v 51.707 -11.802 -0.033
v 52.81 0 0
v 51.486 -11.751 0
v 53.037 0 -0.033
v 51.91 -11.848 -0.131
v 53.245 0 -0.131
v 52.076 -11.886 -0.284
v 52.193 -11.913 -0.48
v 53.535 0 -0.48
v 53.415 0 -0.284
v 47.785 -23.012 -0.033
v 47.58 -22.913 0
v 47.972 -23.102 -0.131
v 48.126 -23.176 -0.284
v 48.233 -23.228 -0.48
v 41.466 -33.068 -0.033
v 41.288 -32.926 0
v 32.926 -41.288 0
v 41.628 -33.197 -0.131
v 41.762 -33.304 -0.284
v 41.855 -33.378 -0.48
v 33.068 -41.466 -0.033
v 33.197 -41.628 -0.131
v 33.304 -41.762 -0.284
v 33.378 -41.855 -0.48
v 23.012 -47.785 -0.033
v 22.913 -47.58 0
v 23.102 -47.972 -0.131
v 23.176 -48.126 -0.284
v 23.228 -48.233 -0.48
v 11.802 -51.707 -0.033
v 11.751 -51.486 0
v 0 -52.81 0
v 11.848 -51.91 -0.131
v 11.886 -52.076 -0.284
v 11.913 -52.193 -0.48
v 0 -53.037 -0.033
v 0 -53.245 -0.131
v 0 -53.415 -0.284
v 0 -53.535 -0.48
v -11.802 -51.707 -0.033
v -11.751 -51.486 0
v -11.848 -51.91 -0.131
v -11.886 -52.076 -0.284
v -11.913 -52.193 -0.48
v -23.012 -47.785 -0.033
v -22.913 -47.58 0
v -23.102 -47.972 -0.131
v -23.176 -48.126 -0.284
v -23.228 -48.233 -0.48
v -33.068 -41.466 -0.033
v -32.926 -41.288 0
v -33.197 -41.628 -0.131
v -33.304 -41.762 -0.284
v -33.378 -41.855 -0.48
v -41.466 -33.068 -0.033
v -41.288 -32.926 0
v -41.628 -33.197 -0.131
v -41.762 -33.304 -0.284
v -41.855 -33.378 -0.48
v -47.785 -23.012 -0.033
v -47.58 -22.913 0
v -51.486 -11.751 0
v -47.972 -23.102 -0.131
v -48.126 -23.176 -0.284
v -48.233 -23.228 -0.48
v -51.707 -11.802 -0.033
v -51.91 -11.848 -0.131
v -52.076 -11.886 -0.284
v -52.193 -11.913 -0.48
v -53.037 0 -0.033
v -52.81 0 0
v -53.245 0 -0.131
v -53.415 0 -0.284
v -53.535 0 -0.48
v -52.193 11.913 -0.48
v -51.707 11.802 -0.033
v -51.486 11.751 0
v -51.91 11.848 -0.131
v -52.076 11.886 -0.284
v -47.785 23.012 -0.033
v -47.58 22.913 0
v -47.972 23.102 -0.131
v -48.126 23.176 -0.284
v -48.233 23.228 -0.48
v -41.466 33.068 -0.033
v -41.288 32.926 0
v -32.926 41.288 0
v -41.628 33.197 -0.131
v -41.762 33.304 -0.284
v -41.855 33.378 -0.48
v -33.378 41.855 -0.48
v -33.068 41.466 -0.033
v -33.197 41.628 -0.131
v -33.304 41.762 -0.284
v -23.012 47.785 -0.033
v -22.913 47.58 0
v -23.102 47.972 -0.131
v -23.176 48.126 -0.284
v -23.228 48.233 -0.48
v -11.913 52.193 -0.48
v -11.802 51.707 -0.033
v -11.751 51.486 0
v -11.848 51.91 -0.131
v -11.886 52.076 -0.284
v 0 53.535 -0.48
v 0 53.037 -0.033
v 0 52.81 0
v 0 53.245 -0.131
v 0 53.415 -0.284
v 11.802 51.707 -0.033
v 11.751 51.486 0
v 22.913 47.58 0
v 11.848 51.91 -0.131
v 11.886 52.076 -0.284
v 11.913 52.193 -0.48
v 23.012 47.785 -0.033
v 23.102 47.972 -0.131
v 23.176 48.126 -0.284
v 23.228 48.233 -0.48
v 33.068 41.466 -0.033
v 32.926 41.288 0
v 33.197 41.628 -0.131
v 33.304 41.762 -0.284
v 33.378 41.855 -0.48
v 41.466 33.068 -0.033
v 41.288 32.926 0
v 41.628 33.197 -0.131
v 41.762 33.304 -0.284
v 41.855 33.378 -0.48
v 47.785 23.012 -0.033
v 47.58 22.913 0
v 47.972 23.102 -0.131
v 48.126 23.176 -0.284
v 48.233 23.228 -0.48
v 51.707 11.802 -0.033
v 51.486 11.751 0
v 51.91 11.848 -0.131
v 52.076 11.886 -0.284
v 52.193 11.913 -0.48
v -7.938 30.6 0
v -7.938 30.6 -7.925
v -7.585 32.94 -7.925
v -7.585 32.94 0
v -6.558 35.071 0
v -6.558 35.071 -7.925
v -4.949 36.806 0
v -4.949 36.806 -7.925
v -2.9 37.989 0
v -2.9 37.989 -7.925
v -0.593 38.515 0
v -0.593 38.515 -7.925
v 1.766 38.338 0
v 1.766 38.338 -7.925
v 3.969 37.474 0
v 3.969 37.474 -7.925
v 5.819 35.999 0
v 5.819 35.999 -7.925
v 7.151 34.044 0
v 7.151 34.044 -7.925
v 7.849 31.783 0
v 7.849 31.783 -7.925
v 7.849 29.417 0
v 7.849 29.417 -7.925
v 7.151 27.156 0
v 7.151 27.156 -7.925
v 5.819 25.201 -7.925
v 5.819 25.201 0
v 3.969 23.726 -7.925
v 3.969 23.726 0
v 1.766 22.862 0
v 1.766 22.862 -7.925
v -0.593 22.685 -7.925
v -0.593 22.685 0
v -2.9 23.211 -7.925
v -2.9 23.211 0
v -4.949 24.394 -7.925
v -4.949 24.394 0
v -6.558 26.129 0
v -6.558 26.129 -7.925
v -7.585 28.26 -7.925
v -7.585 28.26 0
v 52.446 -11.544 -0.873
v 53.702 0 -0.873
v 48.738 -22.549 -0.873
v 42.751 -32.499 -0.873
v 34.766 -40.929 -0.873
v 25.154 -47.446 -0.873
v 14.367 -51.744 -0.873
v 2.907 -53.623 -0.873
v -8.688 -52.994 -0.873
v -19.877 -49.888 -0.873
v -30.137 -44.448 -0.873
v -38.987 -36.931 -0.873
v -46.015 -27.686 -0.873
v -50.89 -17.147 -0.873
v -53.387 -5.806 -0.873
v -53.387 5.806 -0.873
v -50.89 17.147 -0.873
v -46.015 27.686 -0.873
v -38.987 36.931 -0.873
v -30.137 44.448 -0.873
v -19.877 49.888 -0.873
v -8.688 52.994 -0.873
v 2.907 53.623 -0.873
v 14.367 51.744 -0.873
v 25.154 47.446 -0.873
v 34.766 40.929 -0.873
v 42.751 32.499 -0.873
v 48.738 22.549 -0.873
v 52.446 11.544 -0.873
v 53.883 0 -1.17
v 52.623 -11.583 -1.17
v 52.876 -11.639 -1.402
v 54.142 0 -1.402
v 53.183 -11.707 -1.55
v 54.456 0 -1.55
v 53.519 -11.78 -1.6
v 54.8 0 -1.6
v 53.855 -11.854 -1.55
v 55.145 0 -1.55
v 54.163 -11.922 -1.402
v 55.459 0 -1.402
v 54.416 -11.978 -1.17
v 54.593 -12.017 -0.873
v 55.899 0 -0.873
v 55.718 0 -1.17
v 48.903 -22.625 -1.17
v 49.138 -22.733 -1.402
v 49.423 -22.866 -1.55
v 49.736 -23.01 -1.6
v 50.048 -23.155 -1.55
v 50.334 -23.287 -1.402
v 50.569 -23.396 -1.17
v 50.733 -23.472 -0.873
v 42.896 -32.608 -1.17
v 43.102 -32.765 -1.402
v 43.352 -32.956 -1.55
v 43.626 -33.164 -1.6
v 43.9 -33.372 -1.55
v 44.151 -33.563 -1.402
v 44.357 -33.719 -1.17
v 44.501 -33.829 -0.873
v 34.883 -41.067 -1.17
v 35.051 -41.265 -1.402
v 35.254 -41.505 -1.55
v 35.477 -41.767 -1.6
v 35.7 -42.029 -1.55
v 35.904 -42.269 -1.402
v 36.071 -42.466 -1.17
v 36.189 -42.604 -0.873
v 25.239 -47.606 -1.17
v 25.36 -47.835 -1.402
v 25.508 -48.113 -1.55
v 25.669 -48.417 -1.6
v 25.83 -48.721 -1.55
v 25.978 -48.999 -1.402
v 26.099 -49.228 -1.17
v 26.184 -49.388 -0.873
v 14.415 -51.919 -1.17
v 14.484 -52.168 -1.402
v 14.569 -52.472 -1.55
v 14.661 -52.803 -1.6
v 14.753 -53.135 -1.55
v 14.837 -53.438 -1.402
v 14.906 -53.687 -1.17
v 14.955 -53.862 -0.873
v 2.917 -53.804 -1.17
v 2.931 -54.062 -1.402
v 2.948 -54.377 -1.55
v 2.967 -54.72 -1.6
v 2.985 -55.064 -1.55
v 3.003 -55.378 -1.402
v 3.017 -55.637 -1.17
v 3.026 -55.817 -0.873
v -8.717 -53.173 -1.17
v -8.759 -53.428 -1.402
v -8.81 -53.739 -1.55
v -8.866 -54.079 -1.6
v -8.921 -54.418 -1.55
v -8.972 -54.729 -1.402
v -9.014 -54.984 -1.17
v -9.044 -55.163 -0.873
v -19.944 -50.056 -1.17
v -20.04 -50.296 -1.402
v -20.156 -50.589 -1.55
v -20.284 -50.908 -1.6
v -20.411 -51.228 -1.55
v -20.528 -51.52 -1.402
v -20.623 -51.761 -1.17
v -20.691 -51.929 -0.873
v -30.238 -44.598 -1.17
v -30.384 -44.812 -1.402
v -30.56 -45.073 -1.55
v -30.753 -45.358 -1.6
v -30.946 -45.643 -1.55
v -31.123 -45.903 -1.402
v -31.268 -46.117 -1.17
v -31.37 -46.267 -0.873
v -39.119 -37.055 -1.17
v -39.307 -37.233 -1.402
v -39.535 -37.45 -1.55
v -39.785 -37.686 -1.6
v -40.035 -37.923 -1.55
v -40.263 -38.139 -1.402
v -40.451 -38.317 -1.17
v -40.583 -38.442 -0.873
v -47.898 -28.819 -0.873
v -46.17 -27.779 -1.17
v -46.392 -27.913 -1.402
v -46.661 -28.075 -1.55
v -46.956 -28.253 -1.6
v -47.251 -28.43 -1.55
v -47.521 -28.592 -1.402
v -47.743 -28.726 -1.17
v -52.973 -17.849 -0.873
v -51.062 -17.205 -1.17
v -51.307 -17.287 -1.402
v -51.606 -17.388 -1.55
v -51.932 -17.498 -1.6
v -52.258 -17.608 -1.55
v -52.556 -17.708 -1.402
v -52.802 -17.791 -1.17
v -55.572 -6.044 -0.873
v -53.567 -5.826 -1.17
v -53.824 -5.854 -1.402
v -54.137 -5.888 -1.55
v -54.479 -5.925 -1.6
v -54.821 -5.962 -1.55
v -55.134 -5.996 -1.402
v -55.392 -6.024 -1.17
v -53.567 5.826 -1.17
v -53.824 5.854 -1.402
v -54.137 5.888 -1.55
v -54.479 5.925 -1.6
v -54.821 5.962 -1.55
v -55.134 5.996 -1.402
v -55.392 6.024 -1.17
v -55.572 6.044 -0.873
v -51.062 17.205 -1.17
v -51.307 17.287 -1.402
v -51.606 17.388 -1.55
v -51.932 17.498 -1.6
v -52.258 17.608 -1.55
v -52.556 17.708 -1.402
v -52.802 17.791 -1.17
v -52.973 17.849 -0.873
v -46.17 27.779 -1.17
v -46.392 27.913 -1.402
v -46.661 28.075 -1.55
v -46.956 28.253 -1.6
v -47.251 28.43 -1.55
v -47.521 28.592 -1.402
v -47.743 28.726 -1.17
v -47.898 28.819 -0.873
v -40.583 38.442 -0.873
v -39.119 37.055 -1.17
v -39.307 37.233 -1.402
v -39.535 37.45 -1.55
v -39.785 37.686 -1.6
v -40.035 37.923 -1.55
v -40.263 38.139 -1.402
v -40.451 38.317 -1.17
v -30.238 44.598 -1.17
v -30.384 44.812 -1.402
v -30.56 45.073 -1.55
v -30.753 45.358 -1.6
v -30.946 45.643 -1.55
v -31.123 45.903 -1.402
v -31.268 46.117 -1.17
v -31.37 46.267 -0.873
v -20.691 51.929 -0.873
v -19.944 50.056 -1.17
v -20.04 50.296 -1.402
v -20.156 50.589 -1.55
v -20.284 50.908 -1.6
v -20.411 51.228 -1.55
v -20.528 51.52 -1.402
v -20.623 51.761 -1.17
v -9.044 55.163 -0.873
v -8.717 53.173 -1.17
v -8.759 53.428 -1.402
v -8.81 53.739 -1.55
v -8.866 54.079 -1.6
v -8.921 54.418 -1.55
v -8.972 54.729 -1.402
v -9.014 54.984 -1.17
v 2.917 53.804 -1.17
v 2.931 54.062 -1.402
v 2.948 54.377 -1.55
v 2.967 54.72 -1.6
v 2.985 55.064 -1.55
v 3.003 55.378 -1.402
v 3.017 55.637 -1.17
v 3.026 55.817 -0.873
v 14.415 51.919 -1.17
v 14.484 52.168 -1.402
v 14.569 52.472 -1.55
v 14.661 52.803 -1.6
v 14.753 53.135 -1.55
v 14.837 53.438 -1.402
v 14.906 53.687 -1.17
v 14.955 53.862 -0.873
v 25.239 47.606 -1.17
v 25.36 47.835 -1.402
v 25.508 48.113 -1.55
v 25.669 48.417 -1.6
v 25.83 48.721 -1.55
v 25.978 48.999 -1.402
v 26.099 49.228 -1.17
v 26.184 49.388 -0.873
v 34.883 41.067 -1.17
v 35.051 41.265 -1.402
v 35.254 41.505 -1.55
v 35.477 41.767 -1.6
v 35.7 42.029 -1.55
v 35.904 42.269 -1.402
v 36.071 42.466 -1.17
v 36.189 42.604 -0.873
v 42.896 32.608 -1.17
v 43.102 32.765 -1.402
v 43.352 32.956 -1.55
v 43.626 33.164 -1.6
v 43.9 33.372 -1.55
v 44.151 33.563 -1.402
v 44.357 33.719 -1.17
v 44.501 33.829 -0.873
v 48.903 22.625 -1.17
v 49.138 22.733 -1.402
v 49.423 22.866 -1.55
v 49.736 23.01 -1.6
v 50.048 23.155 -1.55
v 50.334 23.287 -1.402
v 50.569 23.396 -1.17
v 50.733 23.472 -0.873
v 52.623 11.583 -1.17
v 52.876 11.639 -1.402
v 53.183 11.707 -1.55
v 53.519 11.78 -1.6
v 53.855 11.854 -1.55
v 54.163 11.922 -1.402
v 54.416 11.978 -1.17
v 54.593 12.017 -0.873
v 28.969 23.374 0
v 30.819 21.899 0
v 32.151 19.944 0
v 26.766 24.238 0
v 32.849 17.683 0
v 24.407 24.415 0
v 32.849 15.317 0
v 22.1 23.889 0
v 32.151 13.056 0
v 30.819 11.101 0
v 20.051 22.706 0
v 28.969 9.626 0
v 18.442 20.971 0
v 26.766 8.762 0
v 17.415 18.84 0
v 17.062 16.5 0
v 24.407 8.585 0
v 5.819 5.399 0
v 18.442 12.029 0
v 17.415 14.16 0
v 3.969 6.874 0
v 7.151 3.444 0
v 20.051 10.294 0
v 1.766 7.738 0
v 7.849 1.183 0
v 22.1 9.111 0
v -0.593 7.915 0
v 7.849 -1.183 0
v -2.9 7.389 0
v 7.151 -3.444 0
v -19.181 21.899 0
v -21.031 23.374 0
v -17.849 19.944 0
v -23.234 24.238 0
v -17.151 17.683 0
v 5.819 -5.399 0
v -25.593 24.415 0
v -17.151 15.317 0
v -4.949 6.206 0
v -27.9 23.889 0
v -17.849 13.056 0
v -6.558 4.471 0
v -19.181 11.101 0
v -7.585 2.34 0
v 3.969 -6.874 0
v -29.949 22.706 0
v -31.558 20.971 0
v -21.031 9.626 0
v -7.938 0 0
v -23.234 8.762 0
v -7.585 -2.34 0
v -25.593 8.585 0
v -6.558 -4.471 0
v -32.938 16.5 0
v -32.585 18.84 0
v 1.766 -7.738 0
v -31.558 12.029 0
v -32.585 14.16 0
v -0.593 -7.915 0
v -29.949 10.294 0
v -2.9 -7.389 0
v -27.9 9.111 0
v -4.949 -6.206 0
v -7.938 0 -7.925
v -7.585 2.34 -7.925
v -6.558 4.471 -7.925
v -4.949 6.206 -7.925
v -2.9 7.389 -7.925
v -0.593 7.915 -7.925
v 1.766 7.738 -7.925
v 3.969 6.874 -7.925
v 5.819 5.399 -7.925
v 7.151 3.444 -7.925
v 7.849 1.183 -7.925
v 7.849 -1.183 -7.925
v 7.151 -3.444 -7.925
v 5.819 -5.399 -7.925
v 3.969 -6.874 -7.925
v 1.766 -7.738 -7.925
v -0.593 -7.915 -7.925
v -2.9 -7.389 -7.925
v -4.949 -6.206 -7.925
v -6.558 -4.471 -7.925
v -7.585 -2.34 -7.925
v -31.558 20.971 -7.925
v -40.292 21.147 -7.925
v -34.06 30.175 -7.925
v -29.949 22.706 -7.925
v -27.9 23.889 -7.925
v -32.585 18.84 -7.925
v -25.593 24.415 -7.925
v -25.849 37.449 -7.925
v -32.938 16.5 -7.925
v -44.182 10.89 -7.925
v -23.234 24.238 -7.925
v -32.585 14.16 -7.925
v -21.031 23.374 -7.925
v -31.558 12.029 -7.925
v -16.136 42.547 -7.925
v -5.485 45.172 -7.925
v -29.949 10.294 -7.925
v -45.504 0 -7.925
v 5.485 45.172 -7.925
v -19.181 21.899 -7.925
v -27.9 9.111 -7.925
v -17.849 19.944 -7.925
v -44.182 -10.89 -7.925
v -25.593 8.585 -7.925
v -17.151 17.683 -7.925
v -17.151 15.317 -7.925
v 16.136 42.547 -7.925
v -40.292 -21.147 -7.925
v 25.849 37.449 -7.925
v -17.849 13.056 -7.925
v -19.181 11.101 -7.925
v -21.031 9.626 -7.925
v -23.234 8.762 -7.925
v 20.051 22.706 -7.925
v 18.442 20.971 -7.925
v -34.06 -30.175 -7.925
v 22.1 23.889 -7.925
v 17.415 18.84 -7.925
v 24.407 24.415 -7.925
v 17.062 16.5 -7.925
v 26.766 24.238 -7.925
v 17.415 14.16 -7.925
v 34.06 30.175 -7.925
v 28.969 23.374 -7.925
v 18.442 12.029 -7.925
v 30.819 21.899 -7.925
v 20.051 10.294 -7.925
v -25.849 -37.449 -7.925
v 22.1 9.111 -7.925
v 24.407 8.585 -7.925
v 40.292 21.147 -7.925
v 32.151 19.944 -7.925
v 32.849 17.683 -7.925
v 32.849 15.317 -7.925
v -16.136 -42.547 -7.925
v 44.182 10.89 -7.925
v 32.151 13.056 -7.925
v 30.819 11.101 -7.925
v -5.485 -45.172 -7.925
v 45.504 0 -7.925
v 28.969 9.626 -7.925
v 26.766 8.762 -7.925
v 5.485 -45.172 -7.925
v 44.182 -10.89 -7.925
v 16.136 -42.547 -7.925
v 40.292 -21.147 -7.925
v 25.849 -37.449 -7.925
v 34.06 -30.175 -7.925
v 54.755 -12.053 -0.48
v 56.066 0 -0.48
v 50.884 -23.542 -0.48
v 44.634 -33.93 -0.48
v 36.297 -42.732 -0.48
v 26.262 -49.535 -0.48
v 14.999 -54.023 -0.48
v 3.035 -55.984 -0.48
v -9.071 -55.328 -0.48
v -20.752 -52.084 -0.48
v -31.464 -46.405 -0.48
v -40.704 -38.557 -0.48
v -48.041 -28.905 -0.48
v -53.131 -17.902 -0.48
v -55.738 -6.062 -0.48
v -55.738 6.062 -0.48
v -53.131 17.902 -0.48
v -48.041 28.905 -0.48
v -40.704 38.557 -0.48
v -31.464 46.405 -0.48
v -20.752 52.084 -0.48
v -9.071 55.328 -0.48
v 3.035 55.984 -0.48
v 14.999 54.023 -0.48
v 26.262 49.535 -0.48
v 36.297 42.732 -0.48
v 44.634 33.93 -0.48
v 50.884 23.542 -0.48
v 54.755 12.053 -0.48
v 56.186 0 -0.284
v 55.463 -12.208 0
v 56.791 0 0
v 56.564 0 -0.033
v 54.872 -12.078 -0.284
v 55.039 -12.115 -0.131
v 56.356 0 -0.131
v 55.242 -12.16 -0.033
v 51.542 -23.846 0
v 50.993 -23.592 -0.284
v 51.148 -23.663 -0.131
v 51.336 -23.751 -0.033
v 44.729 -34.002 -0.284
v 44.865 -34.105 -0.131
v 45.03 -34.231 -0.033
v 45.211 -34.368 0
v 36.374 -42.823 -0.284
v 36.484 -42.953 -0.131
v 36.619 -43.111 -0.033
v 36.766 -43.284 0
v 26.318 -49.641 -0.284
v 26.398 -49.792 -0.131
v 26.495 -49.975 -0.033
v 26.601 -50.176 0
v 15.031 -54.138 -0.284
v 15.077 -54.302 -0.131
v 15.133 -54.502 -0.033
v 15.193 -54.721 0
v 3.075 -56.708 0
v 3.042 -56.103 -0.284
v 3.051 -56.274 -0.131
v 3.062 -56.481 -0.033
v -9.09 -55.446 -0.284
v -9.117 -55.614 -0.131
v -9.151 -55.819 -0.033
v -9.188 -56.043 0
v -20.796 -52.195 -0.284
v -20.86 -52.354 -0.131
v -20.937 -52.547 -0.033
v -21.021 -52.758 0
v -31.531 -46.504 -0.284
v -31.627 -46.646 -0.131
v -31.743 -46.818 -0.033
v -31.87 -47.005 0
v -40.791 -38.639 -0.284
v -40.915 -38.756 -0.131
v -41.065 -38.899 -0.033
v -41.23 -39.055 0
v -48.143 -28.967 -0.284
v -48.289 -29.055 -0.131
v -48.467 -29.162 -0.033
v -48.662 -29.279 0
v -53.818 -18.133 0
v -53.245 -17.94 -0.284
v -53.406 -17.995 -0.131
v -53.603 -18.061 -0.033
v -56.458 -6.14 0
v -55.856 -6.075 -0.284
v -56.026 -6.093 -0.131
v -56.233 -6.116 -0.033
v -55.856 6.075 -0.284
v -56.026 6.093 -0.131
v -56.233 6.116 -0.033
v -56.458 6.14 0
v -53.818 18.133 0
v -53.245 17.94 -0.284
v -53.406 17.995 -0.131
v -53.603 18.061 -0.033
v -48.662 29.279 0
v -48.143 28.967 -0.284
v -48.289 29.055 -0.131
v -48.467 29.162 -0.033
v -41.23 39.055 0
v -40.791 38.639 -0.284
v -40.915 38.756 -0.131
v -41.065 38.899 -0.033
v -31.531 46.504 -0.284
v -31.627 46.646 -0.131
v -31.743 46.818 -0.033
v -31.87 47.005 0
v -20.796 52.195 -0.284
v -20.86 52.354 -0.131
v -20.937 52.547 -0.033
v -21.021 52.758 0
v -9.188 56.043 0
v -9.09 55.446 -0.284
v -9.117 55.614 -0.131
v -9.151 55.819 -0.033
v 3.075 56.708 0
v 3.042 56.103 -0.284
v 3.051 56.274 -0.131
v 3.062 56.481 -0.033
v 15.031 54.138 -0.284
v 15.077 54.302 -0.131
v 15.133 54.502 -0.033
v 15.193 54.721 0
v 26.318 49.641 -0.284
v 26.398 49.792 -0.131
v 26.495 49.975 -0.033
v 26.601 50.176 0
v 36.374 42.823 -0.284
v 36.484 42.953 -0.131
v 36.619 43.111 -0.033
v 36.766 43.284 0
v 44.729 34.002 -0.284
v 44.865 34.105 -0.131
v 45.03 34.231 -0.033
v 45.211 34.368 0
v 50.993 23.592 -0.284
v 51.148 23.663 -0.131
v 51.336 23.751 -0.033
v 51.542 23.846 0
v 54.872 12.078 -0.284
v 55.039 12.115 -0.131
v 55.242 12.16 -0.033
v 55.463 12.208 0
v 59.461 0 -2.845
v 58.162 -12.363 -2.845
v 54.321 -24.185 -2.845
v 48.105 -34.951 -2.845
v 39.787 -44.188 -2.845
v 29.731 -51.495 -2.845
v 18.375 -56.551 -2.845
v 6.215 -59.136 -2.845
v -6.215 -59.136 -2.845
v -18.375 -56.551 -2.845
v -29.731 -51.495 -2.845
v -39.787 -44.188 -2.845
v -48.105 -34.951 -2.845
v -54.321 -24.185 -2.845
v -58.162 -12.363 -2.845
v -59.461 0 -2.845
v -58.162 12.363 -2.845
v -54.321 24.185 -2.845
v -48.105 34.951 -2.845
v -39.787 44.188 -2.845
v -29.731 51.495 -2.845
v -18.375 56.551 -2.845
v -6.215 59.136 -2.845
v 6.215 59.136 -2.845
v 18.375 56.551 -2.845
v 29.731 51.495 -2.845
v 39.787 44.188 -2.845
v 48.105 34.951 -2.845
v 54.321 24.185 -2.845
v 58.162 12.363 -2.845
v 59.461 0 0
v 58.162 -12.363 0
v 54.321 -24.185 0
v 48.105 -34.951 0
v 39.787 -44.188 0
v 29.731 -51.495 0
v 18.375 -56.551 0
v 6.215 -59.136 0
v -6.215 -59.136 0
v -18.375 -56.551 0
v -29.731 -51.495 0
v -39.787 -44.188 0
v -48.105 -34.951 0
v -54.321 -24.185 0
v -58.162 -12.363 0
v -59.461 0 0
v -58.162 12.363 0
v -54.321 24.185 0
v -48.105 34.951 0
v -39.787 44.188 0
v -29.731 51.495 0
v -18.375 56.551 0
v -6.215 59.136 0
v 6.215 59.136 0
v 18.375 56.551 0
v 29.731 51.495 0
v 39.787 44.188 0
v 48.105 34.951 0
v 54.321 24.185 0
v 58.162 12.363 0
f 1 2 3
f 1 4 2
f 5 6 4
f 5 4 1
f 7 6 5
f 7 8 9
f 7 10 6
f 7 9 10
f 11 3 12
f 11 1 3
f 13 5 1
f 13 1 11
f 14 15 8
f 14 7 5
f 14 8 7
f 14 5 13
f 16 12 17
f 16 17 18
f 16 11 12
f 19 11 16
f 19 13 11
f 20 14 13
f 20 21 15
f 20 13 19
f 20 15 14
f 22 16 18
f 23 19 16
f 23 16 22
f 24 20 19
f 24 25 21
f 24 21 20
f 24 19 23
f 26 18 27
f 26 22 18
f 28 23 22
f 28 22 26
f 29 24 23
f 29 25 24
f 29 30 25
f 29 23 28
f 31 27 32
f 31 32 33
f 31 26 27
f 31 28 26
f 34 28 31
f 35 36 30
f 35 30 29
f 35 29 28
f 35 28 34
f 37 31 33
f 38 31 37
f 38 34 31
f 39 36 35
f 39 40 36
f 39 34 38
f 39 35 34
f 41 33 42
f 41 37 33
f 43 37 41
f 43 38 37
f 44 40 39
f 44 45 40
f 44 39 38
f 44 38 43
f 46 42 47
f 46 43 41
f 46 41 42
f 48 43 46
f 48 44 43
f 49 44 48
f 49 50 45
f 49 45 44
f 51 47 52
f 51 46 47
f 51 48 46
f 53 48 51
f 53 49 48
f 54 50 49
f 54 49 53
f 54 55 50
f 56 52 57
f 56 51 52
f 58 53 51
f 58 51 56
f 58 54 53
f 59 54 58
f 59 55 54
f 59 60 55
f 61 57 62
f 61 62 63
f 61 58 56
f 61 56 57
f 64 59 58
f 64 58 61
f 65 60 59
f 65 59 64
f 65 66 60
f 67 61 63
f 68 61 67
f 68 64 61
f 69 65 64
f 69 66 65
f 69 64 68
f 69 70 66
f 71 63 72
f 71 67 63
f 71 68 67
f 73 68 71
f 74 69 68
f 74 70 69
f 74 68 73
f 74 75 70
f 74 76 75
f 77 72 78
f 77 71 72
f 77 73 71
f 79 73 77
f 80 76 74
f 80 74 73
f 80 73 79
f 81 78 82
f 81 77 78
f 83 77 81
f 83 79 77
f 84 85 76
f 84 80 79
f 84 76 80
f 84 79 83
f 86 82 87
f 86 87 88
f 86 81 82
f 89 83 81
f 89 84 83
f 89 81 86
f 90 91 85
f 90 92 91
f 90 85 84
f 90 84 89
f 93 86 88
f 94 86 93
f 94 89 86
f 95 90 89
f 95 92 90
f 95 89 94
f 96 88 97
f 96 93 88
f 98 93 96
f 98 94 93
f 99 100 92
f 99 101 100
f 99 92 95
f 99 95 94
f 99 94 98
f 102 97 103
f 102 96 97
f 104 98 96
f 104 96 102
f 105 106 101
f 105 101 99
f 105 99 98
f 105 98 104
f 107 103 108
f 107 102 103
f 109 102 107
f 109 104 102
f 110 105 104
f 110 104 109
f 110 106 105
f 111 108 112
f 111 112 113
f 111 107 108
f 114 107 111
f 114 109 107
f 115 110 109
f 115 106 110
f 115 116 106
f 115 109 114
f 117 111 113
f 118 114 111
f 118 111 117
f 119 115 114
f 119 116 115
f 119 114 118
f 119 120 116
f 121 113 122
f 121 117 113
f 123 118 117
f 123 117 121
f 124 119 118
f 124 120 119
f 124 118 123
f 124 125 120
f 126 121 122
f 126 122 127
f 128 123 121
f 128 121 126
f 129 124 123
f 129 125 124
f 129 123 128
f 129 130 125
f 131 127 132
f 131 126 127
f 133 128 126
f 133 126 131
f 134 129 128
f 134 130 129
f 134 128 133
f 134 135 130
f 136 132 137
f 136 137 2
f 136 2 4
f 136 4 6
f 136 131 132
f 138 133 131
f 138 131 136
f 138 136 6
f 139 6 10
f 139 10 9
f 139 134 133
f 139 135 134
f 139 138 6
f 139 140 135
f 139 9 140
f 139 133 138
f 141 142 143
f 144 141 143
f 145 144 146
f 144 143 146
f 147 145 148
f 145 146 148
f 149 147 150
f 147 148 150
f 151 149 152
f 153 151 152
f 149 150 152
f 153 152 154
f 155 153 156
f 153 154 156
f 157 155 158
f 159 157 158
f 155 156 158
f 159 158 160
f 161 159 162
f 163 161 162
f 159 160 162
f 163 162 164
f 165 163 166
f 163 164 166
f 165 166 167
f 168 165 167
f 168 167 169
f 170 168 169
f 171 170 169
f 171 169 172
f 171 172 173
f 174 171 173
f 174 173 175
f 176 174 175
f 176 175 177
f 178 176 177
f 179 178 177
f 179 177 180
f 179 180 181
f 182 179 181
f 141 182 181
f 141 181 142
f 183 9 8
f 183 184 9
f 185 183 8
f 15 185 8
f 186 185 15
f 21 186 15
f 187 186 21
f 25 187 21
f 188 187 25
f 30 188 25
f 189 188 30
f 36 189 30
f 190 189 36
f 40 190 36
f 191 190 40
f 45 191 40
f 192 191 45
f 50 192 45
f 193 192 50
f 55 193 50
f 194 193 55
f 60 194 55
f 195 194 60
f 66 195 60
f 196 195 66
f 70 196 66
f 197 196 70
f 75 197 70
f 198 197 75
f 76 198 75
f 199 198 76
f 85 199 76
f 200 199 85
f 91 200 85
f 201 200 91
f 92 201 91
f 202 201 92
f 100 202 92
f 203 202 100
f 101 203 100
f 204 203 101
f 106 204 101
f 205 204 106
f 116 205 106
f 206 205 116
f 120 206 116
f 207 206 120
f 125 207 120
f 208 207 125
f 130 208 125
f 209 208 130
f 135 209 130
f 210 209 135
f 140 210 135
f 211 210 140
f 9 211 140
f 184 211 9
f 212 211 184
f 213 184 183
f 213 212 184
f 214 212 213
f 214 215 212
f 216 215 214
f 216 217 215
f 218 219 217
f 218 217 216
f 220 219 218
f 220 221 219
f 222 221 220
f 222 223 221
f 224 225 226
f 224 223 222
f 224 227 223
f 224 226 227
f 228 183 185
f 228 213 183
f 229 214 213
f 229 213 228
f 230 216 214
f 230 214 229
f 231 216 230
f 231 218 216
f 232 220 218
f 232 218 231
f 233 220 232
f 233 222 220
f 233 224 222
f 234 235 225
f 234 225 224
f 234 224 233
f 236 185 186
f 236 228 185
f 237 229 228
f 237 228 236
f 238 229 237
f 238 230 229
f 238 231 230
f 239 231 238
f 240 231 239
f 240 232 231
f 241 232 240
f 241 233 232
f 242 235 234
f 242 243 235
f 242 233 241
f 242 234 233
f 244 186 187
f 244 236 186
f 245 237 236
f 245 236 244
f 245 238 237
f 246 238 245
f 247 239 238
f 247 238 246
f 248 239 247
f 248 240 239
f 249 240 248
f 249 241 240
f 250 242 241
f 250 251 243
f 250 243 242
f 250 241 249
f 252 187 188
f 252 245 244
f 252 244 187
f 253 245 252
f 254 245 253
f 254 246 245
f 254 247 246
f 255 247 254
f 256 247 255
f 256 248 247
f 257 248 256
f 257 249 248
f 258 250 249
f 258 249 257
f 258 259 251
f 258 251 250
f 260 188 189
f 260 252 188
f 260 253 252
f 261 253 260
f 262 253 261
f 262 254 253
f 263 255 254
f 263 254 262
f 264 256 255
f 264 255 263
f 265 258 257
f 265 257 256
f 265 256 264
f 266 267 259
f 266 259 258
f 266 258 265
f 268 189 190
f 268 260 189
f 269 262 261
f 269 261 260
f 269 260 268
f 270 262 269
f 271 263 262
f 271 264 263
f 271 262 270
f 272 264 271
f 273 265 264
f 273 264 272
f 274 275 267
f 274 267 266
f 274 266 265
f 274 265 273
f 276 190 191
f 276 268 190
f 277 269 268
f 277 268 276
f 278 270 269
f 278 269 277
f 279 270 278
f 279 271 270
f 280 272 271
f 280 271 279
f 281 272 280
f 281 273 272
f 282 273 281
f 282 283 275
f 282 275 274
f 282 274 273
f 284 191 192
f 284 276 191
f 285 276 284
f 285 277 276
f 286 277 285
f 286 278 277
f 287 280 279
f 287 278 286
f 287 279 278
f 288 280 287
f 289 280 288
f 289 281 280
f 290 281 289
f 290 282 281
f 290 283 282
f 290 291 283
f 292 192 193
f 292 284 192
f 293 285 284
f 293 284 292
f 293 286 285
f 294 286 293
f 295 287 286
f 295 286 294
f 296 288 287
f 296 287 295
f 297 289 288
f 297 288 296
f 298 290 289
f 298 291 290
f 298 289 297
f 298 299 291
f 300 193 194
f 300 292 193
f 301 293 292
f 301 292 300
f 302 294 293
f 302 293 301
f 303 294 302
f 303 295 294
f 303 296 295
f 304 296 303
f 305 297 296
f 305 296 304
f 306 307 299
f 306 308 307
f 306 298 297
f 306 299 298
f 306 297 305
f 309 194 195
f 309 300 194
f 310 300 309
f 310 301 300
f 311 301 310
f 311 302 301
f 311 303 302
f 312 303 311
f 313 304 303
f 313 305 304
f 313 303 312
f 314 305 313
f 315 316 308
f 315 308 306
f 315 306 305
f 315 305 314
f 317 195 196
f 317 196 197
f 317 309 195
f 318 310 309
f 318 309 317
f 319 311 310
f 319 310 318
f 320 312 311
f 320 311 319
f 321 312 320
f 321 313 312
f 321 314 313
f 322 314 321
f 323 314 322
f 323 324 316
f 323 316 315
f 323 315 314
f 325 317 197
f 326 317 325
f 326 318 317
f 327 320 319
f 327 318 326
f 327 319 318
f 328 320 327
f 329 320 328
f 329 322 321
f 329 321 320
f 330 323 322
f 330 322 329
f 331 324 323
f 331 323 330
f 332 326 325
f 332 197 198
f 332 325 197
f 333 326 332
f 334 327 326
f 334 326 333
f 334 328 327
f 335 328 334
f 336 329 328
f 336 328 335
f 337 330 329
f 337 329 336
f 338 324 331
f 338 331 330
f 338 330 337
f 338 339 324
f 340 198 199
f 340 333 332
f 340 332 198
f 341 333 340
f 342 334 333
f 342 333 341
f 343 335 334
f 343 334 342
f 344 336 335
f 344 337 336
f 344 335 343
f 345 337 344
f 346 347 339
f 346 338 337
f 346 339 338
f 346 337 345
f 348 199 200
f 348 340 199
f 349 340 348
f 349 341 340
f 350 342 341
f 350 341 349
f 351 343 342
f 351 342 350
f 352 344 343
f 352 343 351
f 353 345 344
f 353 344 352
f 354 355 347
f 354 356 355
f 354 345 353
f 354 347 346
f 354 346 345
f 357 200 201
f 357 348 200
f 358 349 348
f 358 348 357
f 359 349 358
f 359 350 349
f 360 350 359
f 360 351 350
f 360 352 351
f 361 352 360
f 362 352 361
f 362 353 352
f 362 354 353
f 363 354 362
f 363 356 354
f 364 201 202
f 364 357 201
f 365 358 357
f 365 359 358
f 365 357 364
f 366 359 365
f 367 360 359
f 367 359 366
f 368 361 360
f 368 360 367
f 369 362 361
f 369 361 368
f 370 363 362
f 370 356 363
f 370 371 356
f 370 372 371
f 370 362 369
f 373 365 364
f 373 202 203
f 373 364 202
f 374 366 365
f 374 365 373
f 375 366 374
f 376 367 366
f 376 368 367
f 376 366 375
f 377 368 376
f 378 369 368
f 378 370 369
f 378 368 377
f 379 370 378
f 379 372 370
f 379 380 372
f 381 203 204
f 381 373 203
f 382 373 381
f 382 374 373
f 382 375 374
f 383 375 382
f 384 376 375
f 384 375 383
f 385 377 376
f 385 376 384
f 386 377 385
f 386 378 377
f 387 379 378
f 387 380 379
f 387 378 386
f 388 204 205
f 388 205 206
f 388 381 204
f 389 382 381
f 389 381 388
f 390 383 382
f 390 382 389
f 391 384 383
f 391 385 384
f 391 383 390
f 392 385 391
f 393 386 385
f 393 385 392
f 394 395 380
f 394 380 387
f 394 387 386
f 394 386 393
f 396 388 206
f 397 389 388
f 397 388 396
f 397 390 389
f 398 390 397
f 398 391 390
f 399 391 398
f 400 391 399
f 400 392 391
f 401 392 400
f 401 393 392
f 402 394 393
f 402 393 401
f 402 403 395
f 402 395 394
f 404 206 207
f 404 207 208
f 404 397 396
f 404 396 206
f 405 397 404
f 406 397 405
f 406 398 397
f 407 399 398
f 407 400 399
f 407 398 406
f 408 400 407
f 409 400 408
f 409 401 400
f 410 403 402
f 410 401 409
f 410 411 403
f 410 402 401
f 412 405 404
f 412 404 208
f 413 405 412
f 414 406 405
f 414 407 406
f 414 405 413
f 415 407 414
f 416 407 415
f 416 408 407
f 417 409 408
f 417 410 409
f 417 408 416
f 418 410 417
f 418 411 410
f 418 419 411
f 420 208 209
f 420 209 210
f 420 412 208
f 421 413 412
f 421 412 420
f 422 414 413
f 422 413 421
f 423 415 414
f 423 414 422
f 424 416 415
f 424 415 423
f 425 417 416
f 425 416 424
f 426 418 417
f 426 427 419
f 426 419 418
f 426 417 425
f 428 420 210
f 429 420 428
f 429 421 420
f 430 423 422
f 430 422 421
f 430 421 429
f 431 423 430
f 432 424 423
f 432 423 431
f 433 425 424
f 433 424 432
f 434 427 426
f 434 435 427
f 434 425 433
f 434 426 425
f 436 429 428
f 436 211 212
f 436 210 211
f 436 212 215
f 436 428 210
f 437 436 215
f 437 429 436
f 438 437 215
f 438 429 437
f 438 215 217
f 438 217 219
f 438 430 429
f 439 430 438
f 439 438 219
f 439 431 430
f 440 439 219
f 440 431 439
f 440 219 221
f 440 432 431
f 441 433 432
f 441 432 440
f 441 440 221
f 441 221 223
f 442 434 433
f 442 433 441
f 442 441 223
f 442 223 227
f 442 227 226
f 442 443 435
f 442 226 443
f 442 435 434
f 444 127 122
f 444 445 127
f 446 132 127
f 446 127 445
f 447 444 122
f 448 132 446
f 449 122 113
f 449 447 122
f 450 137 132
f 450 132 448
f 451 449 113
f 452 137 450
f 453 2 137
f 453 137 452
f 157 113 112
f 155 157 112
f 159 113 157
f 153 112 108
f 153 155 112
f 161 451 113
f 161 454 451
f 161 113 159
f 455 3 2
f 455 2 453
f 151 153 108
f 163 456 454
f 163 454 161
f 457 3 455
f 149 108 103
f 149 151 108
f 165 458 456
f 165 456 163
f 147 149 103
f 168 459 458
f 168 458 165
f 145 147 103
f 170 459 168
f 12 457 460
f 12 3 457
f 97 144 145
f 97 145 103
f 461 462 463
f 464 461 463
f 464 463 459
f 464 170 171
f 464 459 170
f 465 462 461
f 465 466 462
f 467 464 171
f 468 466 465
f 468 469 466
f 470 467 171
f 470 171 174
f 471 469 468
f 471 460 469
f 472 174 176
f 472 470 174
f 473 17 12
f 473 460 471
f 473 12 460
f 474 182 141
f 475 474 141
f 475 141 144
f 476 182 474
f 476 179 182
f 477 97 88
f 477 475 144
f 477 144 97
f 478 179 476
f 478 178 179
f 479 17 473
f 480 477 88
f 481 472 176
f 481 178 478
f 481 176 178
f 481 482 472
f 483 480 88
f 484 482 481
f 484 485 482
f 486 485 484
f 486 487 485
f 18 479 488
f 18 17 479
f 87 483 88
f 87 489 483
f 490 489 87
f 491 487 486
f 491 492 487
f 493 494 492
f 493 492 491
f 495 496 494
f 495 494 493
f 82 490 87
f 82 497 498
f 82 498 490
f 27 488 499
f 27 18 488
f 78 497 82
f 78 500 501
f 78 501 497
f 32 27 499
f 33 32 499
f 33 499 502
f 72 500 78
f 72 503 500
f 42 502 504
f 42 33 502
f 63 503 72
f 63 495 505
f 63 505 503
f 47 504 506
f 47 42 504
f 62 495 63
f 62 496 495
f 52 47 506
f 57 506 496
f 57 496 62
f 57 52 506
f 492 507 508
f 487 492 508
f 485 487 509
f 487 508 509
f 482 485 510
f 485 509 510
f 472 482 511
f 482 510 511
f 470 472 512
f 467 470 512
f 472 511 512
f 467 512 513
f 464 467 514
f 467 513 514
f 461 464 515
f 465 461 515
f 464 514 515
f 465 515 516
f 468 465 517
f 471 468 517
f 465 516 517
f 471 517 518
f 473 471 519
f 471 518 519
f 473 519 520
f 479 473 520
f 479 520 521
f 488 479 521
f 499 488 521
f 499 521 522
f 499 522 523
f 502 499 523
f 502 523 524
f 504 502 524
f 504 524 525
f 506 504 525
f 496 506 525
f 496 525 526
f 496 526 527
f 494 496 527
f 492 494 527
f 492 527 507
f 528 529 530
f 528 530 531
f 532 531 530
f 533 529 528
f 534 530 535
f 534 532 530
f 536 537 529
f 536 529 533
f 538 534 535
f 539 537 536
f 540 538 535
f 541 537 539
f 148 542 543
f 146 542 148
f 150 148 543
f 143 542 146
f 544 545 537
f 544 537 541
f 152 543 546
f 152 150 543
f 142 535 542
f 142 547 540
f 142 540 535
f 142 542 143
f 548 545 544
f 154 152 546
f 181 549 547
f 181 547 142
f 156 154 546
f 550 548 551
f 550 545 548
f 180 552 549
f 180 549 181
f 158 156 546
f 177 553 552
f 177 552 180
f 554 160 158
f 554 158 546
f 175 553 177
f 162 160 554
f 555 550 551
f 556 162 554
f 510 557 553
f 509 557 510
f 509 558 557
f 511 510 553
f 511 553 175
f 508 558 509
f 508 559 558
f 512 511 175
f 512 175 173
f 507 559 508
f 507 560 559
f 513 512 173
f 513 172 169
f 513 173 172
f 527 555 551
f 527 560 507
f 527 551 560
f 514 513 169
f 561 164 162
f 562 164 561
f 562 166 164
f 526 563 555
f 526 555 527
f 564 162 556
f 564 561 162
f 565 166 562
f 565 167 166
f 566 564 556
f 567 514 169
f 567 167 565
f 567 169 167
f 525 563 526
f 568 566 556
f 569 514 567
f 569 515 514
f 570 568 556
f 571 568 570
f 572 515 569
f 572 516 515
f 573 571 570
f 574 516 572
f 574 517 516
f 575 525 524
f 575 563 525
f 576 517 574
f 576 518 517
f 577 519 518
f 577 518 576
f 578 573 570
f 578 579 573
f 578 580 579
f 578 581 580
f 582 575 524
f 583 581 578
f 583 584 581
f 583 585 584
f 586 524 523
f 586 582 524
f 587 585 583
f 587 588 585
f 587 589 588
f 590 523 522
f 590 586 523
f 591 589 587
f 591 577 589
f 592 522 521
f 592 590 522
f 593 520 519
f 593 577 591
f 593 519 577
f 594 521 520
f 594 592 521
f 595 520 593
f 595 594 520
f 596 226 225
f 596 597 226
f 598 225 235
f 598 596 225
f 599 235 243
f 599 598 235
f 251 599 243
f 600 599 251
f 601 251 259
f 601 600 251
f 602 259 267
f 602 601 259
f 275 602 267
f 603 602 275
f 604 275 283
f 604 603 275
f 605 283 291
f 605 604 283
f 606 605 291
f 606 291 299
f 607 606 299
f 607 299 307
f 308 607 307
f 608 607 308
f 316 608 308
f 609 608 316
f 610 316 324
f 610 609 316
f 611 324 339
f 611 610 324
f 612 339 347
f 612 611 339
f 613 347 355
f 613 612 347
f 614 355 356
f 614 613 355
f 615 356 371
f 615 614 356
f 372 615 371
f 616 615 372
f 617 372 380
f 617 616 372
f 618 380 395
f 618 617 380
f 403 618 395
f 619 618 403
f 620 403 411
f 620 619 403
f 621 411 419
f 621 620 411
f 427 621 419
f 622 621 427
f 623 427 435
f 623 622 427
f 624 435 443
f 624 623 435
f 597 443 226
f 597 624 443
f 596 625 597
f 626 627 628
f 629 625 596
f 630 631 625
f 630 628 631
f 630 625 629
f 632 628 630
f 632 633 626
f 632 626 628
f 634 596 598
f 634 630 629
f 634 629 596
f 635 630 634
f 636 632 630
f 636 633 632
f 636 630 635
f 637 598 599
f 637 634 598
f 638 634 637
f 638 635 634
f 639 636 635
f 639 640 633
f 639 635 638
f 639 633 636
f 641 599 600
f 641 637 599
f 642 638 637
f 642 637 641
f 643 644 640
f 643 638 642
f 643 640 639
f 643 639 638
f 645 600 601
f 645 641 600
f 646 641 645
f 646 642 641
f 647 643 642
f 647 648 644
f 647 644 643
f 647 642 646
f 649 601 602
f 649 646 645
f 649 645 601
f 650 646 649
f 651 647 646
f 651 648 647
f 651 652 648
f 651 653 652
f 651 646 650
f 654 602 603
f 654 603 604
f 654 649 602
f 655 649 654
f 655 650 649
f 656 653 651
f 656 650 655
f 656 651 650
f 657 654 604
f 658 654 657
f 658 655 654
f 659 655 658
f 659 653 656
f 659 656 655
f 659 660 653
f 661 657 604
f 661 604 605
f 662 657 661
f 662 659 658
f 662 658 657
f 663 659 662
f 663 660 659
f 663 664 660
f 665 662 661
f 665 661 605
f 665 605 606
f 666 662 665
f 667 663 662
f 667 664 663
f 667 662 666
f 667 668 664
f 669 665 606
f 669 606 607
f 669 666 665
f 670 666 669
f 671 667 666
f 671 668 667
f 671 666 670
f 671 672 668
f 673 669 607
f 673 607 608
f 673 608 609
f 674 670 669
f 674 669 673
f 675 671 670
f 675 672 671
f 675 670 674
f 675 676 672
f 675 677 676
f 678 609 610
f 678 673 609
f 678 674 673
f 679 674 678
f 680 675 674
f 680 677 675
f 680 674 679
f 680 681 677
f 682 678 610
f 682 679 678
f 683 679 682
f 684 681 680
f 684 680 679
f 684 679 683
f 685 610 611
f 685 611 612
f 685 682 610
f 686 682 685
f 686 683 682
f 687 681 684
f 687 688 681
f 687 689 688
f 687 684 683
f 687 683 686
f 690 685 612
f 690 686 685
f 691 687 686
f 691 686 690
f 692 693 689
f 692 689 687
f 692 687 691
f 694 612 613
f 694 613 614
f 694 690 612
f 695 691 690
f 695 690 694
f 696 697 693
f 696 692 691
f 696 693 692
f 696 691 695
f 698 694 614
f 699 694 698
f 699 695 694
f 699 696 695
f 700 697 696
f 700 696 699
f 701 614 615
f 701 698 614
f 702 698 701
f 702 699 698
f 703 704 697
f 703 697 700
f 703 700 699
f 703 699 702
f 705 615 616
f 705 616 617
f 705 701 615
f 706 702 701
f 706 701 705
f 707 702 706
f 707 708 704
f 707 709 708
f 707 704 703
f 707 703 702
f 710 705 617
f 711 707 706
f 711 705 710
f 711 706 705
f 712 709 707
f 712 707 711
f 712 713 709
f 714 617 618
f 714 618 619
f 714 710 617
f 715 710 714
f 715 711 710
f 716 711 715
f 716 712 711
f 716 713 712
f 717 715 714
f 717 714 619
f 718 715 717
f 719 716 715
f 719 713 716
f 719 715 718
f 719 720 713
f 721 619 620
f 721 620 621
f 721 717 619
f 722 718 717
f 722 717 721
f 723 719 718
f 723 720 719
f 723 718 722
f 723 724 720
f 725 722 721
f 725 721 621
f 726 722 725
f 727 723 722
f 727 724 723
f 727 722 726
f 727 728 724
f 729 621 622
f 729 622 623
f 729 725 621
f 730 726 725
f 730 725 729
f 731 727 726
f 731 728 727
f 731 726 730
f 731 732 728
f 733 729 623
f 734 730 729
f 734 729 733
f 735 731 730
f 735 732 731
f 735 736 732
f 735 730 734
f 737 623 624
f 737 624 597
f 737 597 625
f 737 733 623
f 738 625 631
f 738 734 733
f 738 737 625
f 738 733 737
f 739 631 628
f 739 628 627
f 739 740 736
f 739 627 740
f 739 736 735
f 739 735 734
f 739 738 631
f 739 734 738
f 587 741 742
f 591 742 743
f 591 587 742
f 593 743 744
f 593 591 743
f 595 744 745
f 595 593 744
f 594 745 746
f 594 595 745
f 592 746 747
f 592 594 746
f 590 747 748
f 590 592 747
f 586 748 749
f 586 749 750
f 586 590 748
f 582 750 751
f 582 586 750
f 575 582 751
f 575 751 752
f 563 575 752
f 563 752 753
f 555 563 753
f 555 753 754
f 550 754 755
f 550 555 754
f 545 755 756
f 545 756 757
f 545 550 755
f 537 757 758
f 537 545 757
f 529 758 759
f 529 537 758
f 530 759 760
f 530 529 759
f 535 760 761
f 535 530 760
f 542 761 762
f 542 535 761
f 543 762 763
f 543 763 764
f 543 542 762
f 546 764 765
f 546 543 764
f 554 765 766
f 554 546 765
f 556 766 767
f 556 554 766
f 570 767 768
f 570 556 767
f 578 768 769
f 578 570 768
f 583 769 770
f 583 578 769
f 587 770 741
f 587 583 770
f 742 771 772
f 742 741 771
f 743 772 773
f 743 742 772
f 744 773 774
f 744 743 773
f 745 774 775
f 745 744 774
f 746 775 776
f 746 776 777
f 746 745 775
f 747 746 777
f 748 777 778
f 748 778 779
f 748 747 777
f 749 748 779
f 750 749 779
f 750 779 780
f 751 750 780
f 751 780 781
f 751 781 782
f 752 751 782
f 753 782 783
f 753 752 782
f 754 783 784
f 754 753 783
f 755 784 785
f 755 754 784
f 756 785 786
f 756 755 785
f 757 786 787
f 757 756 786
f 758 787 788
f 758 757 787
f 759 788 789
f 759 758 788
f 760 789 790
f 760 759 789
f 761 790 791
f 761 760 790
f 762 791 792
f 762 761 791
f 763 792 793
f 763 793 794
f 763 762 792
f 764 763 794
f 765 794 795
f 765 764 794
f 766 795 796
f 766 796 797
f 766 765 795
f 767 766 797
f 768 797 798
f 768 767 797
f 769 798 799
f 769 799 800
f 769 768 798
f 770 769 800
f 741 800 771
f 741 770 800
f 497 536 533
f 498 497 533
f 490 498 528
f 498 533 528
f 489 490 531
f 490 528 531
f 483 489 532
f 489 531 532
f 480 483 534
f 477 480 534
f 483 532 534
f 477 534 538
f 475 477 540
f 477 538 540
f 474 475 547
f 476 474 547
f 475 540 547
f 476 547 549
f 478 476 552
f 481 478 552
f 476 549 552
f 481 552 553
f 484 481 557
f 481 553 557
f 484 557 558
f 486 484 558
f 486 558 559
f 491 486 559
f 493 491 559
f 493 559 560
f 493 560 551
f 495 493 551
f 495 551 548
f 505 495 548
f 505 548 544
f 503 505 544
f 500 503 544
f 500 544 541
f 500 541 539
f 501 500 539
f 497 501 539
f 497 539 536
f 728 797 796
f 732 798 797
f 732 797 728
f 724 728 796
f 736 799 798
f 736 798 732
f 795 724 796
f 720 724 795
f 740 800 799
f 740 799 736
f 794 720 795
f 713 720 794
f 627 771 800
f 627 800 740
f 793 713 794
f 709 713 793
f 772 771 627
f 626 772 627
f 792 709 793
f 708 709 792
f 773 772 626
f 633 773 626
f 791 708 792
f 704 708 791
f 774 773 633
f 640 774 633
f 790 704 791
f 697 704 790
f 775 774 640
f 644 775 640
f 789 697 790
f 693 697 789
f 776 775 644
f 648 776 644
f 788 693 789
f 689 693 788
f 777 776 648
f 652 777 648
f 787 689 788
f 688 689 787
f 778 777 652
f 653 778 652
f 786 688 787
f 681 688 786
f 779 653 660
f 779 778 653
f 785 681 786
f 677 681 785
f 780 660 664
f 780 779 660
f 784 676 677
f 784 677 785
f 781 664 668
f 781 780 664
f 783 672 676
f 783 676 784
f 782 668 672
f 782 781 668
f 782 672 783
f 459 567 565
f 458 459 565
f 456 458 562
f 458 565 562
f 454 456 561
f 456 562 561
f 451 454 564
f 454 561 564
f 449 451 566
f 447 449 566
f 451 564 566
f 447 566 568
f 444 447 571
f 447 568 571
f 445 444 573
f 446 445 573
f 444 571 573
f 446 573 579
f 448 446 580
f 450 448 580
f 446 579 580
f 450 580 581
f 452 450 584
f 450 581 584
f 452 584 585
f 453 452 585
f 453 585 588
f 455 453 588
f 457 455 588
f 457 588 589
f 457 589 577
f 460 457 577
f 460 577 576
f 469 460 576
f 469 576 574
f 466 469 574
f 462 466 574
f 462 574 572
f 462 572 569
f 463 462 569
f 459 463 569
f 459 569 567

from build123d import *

# Parameters (mm, degrees)
SKETCH2_R          = 7.9375
CUT_EXTRUDE1_DEPTH = 85.463711951


with BuildPart() as part:
    # Sketch1 → Revolve1 (revolve)
    with BuildSketch(Plane(origin=(0, 0, 0), x_dir=(0, 0, -1), z_dir=(1, 0, 0)), mode=Mode.PRIVATE) as revolve1_sk:
        with BuildLine():
            Line((0, 0), (0, 52.809927725))
            ThreePointArc((0, 52.809927725), (0.130798304, 53.244522907), (0.479738309, 53.534733247))
            Line((0.479738309, 53.534733247), (0.872854821, 53.701601306))
            ThreePointArc((0.872854821, 53.701601306), (1.6002, 54.8005), (0.872854821, 55.899398694))
            Line((0.872854821, 55.899398694), (0.479738309, 56.066266753))
            ThreePointArc((0.479738309, 56.066266753), (0.130798304, 56.356477093), (0, 56.791072275))
            Line((0, 56.791072275), (0, 59.4614))
            Line((0, 59.4614), (2.8448, 59.4614))
            Line((2.8448, 59.4614), (7.9248, 45.504214709))
            Line((7.9248, 45.504214709), (7.9248, 0))
            Line((7.9248, 0), (0, 0))
        make_face()
    revolve(revolve1_sk.sketch.rotate(Axis((0, 0, 0), (0, 0, -1)), 90), axis=Axis((0, 0, 0), (0, 0, -1)))

    # Sketch2 → Cut-Extrude1 (cut, through all)
    with BuildSketch(Plane(origin=(0, 0, -7.9248), x_dir=(-1, 0, 0), z_dir=(0, 0, -1))):
        with Locations((-25, 16.5)):
            Circle(SKETCH2_R)
        with Locations((0, 30.6)):
            Circle(SKETCH2_R)
        with Locations((25, 16.5)):
            Circle(SKETCH2_R)
        Circle(SKETCH2_R)
    extrude(amount=-CUT_EXTRUDE1_DEPTH, mode=Mode.SUBTRACT)


solid = part.part
